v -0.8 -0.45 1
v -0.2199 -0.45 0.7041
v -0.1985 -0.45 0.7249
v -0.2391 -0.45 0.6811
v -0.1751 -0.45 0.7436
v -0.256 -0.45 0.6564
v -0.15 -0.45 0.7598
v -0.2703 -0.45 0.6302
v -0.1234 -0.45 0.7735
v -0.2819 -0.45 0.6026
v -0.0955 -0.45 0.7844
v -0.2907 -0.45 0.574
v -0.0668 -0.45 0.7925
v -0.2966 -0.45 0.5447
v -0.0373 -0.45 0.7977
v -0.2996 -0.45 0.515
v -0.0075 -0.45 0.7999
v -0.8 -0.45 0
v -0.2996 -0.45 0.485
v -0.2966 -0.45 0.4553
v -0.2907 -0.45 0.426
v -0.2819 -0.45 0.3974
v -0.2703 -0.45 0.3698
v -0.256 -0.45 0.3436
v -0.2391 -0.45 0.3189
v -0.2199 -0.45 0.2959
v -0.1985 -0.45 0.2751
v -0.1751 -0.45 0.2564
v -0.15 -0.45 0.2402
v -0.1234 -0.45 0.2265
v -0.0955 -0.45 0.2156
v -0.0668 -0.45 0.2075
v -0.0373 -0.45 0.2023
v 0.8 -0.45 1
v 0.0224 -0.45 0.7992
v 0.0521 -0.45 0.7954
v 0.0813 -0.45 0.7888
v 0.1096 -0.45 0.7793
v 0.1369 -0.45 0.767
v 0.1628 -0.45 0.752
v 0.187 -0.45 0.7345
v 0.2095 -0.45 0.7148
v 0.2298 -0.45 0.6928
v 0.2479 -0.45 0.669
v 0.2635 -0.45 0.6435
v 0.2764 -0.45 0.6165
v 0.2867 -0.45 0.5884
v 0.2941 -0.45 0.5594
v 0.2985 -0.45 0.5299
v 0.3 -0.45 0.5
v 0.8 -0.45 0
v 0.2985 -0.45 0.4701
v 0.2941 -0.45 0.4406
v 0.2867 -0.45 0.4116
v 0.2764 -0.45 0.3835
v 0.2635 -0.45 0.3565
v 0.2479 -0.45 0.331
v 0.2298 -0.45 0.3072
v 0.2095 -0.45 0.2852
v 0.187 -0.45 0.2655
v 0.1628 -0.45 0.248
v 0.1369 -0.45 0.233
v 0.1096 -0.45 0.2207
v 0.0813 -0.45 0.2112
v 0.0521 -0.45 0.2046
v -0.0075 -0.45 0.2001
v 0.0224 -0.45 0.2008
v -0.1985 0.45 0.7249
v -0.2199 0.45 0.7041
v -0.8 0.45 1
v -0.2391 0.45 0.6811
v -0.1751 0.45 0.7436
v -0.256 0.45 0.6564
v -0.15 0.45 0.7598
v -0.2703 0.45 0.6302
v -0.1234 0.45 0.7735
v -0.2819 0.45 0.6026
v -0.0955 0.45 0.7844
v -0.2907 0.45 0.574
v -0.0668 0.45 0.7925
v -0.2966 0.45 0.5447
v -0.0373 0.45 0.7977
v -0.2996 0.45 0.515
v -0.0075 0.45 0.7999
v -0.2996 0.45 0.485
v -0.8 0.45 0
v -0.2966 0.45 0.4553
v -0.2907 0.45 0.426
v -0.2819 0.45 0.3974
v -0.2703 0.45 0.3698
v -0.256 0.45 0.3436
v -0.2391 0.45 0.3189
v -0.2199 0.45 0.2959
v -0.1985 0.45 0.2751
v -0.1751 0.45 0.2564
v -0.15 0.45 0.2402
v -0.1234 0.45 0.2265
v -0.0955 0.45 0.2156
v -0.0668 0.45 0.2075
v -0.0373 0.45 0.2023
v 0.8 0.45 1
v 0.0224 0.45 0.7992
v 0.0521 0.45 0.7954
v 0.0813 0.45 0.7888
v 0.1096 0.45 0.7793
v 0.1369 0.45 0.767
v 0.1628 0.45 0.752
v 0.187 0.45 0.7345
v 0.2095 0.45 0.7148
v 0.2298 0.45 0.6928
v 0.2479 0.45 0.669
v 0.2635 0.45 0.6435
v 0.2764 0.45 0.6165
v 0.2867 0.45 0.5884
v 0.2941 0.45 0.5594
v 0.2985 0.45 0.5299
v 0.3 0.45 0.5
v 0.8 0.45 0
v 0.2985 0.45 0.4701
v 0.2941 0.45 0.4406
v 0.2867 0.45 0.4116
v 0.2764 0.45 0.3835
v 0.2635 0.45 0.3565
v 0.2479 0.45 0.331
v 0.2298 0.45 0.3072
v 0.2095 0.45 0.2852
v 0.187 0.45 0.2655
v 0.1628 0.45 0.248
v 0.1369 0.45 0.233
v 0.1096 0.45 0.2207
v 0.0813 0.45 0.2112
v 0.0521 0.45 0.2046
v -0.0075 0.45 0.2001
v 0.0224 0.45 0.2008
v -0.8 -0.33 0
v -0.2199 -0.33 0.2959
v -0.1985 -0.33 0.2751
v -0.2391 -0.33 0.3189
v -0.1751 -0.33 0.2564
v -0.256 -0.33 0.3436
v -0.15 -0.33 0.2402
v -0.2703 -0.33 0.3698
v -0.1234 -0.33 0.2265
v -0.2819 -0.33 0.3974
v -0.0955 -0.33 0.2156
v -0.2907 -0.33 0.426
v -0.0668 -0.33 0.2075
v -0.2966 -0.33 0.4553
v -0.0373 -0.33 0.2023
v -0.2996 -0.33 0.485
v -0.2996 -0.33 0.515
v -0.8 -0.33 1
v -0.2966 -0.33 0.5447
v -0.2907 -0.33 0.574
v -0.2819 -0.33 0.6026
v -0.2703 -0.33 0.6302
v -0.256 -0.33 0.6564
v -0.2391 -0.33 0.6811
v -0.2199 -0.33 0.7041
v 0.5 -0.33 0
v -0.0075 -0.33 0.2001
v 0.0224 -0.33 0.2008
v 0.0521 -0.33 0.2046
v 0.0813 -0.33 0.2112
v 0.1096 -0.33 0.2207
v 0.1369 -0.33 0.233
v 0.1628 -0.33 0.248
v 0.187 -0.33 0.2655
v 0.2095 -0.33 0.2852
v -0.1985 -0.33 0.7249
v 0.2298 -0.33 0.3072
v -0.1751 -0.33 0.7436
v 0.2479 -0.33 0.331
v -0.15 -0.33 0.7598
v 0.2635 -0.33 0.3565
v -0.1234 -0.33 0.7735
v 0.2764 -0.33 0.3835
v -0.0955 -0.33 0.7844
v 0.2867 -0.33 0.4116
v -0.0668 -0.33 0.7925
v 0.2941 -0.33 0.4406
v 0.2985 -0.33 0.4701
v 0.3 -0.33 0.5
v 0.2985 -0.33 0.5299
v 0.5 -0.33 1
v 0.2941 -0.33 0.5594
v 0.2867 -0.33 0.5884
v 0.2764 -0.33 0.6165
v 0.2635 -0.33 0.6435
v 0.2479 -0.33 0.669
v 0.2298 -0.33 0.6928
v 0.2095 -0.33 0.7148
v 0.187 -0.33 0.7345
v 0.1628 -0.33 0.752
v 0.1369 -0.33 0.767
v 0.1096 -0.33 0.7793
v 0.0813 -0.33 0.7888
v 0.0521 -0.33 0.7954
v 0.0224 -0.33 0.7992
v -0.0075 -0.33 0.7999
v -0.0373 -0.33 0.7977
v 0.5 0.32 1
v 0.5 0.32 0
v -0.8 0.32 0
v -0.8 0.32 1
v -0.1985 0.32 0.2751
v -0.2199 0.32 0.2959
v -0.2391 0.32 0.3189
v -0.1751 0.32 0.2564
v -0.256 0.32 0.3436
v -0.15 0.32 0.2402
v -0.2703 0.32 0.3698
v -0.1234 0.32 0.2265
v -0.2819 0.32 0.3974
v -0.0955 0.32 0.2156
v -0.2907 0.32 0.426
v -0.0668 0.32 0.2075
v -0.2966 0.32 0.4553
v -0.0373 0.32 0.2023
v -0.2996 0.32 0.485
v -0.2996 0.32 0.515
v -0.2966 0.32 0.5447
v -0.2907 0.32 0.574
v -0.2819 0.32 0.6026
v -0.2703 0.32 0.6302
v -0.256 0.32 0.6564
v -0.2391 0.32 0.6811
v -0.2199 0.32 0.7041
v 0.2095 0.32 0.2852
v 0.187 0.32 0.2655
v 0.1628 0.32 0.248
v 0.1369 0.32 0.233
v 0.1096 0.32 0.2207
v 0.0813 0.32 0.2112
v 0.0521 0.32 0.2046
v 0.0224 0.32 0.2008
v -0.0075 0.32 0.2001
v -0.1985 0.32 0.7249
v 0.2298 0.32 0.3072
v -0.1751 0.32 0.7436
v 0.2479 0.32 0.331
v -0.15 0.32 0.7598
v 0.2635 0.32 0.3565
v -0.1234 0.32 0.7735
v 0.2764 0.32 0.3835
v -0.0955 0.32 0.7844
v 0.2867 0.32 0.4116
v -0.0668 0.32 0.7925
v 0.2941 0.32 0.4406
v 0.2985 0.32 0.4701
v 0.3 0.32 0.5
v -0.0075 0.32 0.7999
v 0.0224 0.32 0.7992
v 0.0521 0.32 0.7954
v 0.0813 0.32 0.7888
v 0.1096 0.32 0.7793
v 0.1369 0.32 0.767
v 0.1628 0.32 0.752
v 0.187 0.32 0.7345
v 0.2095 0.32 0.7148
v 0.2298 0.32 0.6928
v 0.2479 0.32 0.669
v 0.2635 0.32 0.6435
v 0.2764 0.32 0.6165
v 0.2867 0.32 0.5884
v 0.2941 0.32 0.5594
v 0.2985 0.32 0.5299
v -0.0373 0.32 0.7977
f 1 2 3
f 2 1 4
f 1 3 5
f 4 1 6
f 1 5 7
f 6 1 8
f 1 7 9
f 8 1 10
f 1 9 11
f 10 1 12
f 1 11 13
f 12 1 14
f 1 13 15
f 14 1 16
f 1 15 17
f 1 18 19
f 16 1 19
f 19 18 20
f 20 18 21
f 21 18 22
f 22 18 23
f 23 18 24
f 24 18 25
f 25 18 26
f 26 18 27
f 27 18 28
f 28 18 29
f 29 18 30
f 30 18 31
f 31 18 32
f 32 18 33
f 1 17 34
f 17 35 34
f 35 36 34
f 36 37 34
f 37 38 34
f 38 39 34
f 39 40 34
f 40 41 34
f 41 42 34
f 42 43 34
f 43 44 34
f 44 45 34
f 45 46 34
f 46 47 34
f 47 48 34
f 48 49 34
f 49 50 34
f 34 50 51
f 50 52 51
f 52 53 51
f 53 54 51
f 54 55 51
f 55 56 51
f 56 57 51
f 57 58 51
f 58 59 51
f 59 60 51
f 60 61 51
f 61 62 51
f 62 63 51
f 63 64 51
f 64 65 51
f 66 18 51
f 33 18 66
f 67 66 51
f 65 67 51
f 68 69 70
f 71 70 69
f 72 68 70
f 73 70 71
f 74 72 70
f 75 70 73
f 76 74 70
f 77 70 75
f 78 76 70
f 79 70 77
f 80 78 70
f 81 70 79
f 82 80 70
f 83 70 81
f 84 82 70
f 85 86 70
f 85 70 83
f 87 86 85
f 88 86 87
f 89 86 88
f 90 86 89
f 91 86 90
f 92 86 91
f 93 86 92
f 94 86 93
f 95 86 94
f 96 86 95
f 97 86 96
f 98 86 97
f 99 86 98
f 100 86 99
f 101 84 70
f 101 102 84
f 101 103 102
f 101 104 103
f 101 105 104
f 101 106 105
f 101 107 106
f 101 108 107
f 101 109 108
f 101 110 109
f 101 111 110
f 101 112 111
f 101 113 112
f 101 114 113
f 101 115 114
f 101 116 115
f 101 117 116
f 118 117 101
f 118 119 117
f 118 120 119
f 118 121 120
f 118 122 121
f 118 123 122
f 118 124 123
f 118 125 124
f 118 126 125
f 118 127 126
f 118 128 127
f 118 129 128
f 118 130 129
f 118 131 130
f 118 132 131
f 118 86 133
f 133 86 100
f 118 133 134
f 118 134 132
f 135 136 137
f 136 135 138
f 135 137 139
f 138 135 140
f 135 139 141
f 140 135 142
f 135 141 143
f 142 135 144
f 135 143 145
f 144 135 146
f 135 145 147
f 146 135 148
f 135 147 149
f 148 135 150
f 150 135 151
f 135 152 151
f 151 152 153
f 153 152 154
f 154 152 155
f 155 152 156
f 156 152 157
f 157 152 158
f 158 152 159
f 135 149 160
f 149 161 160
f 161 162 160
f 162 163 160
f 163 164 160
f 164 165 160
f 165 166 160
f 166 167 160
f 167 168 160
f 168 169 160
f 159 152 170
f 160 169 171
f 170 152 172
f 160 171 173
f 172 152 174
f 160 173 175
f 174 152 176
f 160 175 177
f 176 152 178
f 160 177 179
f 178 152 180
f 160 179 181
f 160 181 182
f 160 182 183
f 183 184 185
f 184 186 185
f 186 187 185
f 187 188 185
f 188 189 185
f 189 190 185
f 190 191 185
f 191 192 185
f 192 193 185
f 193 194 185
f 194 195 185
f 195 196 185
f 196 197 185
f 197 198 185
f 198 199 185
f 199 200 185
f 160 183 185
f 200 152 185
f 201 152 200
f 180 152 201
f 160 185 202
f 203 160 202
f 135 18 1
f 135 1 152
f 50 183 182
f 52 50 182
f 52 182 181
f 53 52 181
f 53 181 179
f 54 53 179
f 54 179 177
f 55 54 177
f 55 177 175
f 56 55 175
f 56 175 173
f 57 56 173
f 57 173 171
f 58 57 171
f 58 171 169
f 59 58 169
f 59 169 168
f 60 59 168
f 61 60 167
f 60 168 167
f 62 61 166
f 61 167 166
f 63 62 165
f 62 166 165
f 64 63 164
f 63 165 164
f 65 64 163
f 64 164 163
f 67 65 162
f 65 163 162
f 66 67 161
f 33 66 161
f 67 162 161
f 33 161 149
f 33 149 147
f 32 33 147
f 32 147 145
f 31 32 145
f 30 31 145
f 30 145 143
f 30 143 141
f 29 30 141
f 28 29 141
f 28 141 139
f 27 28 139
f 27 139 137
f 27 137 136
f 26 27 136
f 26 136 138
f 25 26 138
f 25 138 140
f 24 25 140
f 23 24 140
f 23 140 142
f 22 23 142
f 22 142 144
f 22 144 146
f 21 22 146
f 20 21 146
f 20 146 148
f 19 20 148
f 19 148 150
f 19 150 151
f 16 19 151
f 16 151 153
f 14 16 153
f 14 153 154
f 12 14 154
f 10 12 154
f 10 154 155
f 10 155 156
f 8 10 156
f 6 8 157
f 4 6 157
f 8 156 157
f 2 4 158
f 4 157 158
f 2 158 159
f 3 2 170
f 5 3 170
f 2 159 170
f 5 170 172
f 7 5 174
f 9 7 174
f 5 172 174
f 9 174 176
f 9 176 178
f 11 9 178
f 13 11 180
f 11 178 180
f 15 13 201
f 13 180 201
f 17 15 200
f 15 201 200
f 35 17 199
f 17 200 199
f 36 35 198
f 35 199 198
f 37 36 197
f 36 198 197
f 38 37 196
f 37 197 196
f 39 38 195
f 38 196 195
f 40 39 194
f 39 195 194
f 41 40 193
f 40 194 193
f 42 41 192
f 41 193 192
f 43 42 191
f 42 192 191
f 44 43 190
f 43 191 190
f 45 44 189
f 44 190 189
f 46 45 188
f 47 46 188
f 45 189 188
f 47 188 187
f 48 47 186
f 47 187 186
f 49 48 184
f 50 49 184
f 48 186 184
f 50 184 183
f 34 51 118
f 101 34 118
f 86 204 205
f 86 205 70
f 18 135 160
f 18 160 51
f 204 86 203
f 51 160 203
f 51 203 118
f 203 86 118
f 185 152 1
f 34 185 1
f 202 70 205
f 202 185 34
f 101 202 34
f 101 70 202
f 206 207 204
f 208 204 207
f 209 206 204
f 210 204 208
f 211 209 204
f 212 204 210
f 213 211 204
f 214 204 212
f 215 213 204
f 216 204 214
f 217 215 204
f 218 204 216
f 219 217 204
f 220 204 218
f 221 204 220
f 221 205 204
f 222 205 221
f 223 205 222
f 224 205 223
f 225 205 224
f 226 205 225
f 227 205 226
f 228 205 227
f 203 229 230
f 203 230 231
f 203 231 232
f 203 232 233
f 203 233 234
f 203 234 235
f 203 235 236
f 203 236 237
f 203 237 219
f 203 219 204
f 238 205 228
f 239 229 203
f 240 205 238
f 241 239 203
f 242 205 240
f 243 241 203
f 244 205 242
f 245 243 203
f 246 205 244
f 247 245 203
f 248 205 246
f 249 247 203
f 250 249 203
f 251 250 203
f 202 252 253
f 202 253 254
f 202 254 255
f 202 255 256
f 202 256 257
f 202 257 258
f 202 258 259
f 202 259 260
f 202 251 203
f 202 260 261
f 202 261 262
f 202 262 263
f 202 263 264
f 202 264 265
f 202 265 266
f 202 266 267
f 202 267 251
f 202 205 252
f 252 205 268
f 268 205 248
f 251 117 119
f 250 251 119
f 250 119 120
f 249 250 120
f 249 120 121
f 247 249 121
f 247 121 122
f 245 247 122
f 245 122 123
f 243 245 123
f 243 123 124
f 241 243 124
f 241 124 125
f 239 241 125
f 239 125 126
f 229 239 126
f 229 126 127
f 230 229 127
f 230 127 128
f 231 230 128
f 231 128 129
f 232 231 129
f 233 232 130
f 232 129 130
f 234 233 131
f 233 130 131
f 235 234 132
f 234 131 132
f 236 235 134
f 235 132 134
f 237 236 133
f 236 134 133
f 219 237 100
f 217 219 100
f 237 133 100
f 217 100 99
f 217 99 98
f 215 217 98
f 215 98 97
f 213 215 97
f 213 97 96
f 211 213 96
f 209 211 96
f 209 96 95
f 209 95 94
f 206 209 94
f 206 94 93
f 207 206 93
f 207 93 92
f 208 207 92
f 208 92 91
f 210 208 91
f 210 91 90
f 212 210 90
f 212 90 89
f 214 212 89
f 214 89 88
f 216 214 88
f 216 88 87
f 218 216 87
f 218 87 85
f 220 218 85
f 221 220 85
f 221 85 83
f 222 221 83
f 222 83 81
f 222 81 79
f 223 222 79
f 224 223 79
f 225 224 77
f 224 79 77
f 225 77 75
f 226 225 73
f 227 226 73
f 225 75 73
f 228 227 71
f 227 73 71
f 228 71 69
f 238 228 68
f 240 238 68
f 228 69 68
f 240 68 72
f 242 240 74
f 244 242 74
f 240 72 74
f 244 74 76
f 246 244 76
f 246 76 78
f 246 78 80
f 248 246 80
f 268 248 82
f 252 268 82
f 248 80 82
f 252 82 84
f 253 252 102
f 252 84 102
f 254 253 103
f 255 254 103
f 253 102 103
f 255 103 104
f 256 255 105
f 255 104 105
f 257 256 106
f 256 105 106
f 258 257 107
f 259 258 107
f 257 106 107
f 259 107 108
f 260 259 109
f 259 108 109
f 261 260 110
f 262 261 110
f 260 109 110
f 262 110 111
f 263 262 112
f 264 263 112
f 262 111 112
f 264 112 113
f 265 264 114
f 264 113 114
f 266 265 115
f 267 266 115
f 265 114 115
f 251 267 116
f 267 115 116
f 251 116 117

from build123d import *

# Parameters (mm, degrees)
SKETCH2_W           = 1.6
SKETCH2_H           = 0.9
BOSS_EXTRUDE2_DEPTH = 1
SKETCH5_R           = 0.3
CUT_EXTRUDE2_DEPTH  = 1
SKETCH6_W           = 1
SKETCH6_H           = 0.65
CUT_EXTRUDE3_DEPTH  = 0.8
SKETCH7_W           = 1.3
SKETCH7_H           = 0.65
CUT_EXTRUDE4_DEPTH  = 1


with BuildPart() as part:
    # Sketch2 → Boss-Extrude2 (new body)
    with BuildSketch(Plane.XY):
        Rectangle(SKETCH2_W, SKETCH2_H)
    extrude(amount=BOSS_EXTRUDE2_DEPTH)

    # Sketch5 → Cut-Extrude2 (cut)
    with BuildSketch(Plane(origin=(0, 0.45, 0), x_dir=(1, 0, 0), z_dir=(0, 1, 0))):
        with Locations((0, -0.5)):
            Circle(SKETCH5_R)
    extrude(amount=-CUT_EXTRUDE2_DEPTH, mode=Mode.SUBTRACT)

    # Sketch6 → Cut-Extrude3 (cut)
    with BuildSketch(Plane.XY.offset(1)):
        with Locations((0, -0.005)):
            Rectangle(SKETCH6_W, SKETCH6_H)
    extrude(amount=-CUT_EXTRUDE3_DEPTH, mode=Mode.SUBTRACT)

    # Sketch7 → Cut-Extrude4 (cut)
    with BuildSketch(Plane.XY.offset(1)):
        with Locations((-0.15, -0.005)):
            Rectangle(SKETCH7_W, SKETCH7_H)
    extrude(amount=-CUT_EXTRUDE4_DEPTH, mode=Mode.SUBTRACT)


solid = part.part
